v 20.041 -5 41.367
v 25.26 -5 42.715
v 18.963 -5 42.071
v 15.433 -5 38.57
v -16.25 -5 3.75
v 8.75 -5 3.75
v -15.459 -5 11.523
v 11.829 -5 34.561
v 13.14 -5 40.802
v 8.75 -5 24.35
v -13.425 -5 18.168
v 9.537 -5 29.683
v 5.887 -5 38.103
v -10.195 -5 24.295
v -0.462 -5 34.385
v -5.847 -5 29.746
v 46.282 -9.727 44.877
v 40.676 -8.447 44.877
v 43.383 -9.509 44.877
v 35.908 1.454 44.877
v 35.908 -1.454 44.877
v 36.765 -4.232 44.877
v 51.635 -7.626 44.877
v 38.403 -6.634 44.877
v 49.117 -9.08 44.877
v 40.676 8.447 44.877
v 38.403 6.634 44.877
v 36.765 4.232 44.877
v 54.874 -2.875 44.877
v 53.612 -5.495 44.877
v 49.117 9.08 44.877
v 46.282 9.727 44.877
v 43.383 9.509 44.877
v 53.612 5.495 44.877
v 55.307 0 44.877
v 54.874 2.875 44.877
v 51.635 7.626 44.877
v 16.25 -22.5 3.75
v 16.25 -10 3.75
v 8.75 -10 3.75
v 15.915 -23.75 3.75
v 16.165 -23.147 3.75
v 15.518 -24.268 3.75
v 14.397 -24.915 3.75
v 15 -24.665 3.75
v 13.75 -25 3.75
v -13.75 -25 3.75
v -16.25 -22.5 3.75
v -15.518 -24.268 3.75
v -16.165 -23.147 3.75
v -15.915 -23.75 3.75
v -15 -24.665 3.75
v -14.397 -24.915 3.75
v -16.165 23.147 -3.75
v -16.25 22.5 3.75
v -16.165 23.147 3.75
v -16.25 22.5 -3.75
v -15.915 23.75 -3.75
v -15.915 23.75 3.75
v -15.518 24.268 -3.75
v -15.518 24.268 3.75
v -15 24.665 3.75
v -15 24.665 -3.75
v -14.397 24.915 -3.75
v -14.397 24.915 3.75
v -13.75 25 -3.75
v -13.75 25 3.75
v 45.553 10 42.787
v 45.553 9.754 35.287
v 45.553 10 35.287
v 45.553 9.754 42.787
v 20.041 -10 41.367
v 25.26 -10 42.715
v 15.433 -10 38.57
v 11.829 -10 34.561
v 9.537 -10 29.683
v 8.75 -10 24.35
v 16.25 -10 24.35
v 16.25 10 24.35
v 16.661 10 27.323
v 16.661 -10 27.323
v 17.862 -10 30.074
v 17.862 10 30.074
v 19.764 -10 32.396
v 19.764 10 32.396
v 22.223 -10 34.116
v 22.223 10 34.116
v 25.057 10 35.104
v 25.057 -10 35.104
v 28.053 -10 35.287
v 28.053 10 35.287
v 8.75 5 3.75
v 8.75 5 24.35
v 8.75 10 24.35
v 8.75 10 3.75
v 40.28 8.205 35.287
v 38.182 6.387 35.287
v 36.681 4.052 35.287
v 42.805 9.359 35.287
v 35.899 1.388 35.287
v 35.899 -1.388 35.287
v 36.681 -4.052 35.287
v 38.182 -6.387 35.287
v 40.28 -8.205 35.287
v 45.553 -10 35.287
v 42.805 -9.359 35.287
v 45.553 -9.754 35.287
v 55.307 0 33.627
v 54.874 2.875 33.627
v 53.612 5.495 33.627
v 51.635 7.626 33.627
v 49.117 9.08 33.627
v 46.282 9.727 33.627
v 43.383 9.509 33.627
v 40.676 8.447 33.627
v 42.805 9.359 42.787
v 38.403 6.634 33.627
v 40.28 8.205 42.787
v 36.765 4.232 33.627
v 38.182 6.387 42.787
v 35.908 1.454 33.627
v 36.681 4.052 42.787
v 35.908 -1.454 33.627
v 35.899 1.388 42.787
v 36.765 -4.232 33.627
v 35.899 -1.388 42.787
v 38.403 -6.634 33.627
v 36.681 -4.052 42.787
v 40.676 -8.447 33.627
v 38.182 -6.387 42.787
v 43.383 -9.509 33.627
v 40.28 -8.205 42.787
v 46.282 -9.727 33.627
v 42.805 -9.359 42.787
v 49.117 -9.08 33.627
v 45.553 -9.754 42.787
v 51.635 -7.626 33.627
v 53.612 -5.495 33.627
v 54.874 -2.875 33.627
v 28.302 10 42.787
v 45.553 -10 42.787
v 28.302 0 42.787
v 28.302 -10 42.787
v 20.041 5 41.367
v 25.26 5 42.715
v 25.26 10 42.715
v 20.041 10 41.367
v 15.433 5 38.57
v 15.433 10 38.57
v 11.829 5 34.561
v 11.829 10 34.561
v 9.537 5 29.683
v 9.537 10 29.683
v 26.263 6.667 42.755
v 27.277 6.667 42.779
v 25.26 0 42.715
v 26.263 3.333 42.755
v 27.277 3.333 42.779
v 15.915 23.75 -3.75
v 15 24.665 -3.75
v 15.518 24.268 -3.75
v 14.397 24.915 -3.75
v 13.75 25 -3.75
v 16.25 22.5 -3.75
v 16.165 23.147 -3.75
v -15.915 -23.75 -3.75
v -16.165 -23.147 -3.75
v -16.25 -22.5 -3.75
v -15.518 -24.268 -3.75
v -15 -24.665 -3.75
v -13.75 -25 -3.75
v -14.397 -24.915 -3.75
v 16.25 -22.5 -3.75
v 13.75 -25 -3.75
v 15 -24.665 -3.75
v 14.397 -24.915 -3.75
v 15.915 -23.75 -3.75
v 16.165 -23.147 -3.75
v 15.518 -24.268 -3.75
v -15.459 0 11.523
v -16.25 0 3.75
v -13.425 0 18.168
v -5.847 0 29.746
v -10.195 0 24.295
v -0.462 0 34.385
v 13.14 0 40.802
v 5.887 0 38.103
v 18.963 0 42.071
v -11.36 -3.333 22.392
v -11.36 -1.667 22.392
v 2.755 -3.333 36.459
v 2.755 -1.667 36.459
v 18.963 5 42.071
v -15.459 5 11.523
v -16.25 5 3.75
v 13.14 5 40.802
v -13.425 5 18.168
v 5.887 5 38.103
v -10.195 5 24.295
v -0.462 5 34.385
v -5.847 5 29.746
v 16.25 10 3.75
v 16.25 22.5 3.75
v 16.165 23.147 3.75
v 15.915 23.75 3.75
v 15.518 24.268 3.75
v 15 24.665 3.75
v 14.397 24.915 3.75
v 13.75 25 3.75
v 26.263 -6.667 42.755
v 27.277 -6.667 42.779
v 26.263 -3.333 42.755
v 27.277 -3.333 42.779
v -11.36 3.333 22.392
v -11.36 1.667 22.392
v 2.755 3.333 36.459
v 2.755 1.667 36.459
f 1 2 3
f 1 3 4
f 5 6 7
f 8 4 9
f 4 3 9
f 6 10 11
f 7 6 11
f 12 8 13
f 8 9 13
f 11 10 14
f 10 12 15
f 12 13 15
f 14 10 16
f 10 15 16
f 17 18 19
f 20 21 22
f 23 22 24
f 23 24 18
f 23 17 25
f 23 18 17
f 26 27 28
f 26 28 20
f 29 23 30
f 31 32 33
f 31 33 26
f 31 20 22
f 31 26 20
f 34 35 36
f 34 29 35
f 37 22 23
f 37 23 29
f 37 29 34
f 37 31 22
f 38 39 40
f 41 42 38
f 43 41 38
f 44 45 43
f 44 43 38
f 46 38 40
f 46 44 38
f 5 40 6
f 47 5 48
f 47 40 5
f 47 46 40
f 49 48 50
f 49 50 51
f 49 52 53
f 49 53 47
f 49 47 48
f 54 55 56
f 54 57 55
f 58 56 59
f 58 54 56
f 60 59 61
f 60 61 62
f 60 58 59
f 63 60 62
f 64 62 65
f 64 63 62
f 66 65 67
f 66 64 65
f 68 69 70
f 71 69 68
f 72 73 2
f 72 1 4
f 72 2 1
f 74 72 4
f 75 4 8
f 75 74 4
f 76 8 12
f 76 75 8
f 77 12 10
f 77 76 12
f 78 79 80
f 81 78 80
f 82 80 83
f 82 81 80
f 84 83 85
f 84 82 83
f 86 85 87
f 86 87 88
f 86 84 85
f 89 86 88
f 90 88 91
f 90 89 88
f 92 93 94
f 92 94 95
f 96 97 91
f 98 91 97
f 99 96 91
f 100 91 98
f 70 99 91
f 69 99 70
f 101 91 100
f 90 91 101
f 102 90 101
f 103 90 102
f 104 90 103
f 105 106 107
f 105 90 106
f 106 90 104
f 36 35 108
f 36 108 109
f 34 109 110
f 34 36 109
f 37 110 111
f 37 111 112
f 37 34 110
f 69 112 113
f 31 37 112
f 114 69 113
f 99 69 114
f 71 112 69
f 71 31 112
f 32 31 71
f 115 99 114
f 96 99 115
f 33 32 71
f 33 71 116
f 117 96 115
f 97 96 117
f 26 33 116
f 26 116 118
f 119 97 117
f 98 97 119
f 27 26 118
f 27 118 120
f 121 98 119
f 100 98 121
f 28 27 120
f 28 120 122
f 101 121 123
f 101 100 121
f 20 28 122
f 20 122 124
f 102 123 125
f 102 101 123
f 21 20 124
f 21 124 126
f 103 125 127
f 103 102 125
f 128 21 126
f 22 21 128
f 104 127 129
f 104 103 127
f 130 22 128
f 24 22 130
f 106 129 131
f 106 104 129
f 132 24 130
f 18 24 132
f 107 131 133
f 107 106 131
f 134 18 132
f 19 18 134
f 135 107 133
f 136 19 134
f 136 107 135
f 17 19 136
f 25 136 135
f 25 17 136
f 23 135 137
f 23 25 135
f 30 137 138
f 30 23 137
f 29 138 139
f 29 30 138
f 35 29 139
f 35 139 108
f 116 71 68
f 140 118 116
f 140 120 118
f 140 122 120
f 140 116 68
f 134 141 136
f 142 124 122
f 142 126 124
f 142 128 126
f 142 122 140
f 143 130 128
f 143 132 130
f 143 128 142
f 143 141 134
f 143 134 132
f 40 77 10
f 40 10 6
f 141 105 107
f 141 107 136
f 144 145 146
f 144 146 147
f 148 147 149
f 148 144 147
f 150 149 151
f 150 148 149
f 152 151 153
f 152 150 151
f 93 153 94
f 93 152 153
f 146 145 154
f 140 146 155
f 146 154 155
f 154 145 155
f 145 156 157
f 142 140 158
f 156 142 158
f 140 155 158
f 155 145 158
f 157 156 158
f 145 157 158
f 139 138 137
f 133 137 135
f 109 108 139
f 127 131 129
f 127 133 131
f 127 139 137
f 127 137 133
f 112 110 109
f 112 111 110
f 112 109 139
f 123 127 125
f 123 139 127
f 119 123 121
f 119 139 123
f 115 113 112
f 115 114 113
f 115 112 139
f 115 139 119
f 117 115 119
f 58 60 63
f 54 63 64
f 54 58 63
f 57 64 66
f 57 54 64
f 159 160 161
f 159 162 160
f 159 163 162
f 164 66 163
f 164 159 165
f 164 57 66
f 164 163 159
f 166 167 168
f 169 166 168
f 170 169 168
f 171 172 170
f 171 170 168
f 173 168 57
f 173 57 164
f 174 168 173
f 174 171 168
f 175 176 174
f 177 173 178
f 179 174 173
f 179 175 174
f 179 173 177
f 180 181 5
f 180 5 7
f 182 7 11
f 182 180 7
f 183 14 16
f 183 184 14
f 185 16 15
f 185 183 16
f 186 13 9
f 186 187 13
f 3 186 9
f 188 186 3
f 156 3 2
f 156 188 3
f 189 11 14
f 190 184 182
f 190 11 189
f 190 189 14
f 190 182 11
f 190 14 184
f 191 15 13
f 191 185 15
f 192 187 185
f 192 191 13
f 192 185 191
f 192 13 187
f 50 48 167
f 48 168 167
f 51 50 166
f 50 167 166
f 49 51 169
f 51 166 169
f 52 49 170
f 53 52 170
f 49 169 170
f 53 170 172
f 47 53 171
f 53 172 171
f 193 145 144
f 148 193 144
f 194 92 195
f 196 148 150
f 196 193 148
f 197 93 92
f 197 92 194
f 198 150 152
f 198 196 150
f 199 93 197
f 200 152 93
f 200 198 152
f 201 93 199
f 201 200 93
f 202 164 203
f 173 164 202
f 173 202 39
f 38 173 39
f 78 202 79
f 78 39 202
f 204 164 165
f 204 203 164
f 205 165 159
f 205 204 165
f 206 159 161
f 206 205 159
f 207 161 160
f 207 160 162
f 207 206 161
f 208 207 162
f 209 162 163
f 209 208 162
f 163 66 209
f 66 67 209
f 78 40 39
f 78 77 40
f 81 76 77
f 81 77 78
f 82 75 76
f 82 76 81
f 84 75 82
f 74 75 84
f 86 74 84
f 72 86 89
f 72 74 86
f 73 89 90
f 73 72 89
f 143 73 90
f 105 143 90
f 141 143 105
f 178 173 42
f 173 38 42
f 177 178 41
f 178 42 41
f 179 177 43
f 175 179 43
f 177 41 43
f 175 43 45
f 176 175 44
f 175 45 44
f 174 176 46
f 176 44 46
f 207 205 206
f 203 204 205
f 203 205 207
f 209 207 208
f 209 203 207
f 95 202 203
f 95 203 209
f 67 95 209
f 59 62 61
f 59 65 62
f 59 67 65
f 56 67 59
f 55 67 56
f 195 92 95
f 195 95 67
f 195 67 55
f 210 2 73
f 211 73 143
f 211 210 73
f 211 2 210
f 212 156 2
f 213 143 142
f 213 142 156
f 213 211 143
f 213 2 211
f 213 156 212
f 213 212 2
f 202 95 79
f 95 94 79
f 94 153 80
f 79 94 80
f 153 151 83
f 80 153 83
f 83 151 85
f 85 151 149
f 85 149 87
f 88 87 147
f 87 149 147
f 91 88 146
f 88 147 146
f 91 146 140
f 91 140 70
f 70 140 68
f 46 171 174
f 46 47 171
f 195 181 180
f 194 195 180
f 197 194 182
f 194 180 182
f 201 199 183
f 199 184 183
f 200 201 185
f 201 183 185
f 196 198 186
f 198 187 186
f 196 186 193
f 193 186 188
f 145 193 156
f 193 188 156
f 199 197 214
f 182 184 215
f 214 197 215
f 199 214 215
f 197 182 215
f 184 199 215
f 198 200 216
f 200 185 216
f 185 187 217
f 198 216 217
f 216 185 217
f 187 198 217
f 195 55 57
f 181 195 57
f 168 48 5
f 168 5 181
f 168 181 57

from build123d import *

# Parameters (mm, degrees)
F1_DEPTH = 2.5
F0_W     = 1.0246116972
F0_H     = 0.75
F2_DEPTH = 1
F3_DEPTH = 0.5
F5_R     = 0.25
F6_SCALE = 10


with BuildPart() as f1:
    # F0 (on Front) → F1 (new body, symmetric)
    with BuildSketch(Plane.XZ):
        Polygon((-1.625, 0.375), (-1.625, -0.375), (1.625, -0.375), (1.625, 0.375), (0.875, 0.375), align=None)
    extrude(amount=F1_DEPTH, both=True)

    # F0 (on Front) → F2 (join, symmetric)
    with BuildSketch(Plane.XZ):
        with BuildLine():
            Line((0.875, 0.375), (1.625, 0.375))
            Line((1.625, 0.375), (1.625, 2.435))
            ThreePointArc((1.625, 2.435), (1.9763518814, 3.2395897205), (2.8053269877, 3.5287489089))
            Line((2.8053269877, 3.5287489089), (3.5307152905, 3.5287489089))
            Line((3.5307152905, 3.5287489089), (3.5307152905, 4.2787489089))
            Line((3.5307152905, 4.2787489089), (2.8301783535, 4.2787489089))
            add(Edge.make_bspline(
                [(2.5259841505, 4.2715011565), (2.6257724531, 4.2763068408), (2.7271772665, 4.2787489089), (2.8301783535, 4.2787489089)],
                knots=[5.7079224482, 5.7079224482, 5.7079224482, 5.7079224482, 5.9235014734, 5.9235014734, 5.9235014734, 5.9235014734], degree=3))
            ThreePointArc((2.5259841505, 4.2715011565), (1.3484222124, 3.6697555591), (0.875, 2.435))
            Line((0.875, 2.435), (0.875, 0.375))
        make_face()
        with Locations((4.0430211391, 3.9037489089)):
            Rectangle(F0_W, F0_H)
    extrude(amount=F2_DEPTH, both=True)

    # F0 (on Front) → F3 (join, symmetric)
    with BuildSketch(Plane.XZ):
        with BuildLine():
            add(Edge.make_bspline(
                [(-1.625, 0.375), (-1.625, 2.3600286686), (-0.1161276805, 4.1442602386), (2.5259841505, 4.2715011565)],
                knots=[0, 0, 0, 0, 5.7079224482, 5.7079224482, 5.7079224482, 5.7079224482], degree=3))
            Line((-1.625, 0.375), (0.875, 0.375))
            Line((0.875, 0.375), (0.875, 2.435))
            ThreePointArc((0.875, 2.435), (1.3484222124, 3.6697555591), (2.5259841505, 4.2715011565))
        make_face()
    extrude(amount=F3_DEPTH, both=True)

    # F0 (on Front) → F4 (revolve)
    with BuildSketch(Plane.XZ):
        Polygon((4.5553269877, 4.4876907729), (4.5553269877, 4.2787489089), (4.5553269877, 3.5287489089), (4.5553269877, 3.3626907729), (5.5307152905, 3.3626907729), (5.5307152905, 4.4876907729), align=None)
    revolve(axis=Axis((4.5553269877, 0, 3.9251907729), (0, 0, 1)))

    # F5
    f5_edges = [f1.edges().sort_by_distance(p)[0] for p in [
        (1.625, -2.5, 0),
        (-1.625, -2.5, 0),
        (1.625, 2.5, 0),
        (-1.625, 2.5, 0),
    ]]
    fillet(f5_edges, radius=F5_R)


with BuildPart() as f1_1:
    # F6: moved
    add(f1.part.scale(F6_SCALE))


solid = f1_1.part
